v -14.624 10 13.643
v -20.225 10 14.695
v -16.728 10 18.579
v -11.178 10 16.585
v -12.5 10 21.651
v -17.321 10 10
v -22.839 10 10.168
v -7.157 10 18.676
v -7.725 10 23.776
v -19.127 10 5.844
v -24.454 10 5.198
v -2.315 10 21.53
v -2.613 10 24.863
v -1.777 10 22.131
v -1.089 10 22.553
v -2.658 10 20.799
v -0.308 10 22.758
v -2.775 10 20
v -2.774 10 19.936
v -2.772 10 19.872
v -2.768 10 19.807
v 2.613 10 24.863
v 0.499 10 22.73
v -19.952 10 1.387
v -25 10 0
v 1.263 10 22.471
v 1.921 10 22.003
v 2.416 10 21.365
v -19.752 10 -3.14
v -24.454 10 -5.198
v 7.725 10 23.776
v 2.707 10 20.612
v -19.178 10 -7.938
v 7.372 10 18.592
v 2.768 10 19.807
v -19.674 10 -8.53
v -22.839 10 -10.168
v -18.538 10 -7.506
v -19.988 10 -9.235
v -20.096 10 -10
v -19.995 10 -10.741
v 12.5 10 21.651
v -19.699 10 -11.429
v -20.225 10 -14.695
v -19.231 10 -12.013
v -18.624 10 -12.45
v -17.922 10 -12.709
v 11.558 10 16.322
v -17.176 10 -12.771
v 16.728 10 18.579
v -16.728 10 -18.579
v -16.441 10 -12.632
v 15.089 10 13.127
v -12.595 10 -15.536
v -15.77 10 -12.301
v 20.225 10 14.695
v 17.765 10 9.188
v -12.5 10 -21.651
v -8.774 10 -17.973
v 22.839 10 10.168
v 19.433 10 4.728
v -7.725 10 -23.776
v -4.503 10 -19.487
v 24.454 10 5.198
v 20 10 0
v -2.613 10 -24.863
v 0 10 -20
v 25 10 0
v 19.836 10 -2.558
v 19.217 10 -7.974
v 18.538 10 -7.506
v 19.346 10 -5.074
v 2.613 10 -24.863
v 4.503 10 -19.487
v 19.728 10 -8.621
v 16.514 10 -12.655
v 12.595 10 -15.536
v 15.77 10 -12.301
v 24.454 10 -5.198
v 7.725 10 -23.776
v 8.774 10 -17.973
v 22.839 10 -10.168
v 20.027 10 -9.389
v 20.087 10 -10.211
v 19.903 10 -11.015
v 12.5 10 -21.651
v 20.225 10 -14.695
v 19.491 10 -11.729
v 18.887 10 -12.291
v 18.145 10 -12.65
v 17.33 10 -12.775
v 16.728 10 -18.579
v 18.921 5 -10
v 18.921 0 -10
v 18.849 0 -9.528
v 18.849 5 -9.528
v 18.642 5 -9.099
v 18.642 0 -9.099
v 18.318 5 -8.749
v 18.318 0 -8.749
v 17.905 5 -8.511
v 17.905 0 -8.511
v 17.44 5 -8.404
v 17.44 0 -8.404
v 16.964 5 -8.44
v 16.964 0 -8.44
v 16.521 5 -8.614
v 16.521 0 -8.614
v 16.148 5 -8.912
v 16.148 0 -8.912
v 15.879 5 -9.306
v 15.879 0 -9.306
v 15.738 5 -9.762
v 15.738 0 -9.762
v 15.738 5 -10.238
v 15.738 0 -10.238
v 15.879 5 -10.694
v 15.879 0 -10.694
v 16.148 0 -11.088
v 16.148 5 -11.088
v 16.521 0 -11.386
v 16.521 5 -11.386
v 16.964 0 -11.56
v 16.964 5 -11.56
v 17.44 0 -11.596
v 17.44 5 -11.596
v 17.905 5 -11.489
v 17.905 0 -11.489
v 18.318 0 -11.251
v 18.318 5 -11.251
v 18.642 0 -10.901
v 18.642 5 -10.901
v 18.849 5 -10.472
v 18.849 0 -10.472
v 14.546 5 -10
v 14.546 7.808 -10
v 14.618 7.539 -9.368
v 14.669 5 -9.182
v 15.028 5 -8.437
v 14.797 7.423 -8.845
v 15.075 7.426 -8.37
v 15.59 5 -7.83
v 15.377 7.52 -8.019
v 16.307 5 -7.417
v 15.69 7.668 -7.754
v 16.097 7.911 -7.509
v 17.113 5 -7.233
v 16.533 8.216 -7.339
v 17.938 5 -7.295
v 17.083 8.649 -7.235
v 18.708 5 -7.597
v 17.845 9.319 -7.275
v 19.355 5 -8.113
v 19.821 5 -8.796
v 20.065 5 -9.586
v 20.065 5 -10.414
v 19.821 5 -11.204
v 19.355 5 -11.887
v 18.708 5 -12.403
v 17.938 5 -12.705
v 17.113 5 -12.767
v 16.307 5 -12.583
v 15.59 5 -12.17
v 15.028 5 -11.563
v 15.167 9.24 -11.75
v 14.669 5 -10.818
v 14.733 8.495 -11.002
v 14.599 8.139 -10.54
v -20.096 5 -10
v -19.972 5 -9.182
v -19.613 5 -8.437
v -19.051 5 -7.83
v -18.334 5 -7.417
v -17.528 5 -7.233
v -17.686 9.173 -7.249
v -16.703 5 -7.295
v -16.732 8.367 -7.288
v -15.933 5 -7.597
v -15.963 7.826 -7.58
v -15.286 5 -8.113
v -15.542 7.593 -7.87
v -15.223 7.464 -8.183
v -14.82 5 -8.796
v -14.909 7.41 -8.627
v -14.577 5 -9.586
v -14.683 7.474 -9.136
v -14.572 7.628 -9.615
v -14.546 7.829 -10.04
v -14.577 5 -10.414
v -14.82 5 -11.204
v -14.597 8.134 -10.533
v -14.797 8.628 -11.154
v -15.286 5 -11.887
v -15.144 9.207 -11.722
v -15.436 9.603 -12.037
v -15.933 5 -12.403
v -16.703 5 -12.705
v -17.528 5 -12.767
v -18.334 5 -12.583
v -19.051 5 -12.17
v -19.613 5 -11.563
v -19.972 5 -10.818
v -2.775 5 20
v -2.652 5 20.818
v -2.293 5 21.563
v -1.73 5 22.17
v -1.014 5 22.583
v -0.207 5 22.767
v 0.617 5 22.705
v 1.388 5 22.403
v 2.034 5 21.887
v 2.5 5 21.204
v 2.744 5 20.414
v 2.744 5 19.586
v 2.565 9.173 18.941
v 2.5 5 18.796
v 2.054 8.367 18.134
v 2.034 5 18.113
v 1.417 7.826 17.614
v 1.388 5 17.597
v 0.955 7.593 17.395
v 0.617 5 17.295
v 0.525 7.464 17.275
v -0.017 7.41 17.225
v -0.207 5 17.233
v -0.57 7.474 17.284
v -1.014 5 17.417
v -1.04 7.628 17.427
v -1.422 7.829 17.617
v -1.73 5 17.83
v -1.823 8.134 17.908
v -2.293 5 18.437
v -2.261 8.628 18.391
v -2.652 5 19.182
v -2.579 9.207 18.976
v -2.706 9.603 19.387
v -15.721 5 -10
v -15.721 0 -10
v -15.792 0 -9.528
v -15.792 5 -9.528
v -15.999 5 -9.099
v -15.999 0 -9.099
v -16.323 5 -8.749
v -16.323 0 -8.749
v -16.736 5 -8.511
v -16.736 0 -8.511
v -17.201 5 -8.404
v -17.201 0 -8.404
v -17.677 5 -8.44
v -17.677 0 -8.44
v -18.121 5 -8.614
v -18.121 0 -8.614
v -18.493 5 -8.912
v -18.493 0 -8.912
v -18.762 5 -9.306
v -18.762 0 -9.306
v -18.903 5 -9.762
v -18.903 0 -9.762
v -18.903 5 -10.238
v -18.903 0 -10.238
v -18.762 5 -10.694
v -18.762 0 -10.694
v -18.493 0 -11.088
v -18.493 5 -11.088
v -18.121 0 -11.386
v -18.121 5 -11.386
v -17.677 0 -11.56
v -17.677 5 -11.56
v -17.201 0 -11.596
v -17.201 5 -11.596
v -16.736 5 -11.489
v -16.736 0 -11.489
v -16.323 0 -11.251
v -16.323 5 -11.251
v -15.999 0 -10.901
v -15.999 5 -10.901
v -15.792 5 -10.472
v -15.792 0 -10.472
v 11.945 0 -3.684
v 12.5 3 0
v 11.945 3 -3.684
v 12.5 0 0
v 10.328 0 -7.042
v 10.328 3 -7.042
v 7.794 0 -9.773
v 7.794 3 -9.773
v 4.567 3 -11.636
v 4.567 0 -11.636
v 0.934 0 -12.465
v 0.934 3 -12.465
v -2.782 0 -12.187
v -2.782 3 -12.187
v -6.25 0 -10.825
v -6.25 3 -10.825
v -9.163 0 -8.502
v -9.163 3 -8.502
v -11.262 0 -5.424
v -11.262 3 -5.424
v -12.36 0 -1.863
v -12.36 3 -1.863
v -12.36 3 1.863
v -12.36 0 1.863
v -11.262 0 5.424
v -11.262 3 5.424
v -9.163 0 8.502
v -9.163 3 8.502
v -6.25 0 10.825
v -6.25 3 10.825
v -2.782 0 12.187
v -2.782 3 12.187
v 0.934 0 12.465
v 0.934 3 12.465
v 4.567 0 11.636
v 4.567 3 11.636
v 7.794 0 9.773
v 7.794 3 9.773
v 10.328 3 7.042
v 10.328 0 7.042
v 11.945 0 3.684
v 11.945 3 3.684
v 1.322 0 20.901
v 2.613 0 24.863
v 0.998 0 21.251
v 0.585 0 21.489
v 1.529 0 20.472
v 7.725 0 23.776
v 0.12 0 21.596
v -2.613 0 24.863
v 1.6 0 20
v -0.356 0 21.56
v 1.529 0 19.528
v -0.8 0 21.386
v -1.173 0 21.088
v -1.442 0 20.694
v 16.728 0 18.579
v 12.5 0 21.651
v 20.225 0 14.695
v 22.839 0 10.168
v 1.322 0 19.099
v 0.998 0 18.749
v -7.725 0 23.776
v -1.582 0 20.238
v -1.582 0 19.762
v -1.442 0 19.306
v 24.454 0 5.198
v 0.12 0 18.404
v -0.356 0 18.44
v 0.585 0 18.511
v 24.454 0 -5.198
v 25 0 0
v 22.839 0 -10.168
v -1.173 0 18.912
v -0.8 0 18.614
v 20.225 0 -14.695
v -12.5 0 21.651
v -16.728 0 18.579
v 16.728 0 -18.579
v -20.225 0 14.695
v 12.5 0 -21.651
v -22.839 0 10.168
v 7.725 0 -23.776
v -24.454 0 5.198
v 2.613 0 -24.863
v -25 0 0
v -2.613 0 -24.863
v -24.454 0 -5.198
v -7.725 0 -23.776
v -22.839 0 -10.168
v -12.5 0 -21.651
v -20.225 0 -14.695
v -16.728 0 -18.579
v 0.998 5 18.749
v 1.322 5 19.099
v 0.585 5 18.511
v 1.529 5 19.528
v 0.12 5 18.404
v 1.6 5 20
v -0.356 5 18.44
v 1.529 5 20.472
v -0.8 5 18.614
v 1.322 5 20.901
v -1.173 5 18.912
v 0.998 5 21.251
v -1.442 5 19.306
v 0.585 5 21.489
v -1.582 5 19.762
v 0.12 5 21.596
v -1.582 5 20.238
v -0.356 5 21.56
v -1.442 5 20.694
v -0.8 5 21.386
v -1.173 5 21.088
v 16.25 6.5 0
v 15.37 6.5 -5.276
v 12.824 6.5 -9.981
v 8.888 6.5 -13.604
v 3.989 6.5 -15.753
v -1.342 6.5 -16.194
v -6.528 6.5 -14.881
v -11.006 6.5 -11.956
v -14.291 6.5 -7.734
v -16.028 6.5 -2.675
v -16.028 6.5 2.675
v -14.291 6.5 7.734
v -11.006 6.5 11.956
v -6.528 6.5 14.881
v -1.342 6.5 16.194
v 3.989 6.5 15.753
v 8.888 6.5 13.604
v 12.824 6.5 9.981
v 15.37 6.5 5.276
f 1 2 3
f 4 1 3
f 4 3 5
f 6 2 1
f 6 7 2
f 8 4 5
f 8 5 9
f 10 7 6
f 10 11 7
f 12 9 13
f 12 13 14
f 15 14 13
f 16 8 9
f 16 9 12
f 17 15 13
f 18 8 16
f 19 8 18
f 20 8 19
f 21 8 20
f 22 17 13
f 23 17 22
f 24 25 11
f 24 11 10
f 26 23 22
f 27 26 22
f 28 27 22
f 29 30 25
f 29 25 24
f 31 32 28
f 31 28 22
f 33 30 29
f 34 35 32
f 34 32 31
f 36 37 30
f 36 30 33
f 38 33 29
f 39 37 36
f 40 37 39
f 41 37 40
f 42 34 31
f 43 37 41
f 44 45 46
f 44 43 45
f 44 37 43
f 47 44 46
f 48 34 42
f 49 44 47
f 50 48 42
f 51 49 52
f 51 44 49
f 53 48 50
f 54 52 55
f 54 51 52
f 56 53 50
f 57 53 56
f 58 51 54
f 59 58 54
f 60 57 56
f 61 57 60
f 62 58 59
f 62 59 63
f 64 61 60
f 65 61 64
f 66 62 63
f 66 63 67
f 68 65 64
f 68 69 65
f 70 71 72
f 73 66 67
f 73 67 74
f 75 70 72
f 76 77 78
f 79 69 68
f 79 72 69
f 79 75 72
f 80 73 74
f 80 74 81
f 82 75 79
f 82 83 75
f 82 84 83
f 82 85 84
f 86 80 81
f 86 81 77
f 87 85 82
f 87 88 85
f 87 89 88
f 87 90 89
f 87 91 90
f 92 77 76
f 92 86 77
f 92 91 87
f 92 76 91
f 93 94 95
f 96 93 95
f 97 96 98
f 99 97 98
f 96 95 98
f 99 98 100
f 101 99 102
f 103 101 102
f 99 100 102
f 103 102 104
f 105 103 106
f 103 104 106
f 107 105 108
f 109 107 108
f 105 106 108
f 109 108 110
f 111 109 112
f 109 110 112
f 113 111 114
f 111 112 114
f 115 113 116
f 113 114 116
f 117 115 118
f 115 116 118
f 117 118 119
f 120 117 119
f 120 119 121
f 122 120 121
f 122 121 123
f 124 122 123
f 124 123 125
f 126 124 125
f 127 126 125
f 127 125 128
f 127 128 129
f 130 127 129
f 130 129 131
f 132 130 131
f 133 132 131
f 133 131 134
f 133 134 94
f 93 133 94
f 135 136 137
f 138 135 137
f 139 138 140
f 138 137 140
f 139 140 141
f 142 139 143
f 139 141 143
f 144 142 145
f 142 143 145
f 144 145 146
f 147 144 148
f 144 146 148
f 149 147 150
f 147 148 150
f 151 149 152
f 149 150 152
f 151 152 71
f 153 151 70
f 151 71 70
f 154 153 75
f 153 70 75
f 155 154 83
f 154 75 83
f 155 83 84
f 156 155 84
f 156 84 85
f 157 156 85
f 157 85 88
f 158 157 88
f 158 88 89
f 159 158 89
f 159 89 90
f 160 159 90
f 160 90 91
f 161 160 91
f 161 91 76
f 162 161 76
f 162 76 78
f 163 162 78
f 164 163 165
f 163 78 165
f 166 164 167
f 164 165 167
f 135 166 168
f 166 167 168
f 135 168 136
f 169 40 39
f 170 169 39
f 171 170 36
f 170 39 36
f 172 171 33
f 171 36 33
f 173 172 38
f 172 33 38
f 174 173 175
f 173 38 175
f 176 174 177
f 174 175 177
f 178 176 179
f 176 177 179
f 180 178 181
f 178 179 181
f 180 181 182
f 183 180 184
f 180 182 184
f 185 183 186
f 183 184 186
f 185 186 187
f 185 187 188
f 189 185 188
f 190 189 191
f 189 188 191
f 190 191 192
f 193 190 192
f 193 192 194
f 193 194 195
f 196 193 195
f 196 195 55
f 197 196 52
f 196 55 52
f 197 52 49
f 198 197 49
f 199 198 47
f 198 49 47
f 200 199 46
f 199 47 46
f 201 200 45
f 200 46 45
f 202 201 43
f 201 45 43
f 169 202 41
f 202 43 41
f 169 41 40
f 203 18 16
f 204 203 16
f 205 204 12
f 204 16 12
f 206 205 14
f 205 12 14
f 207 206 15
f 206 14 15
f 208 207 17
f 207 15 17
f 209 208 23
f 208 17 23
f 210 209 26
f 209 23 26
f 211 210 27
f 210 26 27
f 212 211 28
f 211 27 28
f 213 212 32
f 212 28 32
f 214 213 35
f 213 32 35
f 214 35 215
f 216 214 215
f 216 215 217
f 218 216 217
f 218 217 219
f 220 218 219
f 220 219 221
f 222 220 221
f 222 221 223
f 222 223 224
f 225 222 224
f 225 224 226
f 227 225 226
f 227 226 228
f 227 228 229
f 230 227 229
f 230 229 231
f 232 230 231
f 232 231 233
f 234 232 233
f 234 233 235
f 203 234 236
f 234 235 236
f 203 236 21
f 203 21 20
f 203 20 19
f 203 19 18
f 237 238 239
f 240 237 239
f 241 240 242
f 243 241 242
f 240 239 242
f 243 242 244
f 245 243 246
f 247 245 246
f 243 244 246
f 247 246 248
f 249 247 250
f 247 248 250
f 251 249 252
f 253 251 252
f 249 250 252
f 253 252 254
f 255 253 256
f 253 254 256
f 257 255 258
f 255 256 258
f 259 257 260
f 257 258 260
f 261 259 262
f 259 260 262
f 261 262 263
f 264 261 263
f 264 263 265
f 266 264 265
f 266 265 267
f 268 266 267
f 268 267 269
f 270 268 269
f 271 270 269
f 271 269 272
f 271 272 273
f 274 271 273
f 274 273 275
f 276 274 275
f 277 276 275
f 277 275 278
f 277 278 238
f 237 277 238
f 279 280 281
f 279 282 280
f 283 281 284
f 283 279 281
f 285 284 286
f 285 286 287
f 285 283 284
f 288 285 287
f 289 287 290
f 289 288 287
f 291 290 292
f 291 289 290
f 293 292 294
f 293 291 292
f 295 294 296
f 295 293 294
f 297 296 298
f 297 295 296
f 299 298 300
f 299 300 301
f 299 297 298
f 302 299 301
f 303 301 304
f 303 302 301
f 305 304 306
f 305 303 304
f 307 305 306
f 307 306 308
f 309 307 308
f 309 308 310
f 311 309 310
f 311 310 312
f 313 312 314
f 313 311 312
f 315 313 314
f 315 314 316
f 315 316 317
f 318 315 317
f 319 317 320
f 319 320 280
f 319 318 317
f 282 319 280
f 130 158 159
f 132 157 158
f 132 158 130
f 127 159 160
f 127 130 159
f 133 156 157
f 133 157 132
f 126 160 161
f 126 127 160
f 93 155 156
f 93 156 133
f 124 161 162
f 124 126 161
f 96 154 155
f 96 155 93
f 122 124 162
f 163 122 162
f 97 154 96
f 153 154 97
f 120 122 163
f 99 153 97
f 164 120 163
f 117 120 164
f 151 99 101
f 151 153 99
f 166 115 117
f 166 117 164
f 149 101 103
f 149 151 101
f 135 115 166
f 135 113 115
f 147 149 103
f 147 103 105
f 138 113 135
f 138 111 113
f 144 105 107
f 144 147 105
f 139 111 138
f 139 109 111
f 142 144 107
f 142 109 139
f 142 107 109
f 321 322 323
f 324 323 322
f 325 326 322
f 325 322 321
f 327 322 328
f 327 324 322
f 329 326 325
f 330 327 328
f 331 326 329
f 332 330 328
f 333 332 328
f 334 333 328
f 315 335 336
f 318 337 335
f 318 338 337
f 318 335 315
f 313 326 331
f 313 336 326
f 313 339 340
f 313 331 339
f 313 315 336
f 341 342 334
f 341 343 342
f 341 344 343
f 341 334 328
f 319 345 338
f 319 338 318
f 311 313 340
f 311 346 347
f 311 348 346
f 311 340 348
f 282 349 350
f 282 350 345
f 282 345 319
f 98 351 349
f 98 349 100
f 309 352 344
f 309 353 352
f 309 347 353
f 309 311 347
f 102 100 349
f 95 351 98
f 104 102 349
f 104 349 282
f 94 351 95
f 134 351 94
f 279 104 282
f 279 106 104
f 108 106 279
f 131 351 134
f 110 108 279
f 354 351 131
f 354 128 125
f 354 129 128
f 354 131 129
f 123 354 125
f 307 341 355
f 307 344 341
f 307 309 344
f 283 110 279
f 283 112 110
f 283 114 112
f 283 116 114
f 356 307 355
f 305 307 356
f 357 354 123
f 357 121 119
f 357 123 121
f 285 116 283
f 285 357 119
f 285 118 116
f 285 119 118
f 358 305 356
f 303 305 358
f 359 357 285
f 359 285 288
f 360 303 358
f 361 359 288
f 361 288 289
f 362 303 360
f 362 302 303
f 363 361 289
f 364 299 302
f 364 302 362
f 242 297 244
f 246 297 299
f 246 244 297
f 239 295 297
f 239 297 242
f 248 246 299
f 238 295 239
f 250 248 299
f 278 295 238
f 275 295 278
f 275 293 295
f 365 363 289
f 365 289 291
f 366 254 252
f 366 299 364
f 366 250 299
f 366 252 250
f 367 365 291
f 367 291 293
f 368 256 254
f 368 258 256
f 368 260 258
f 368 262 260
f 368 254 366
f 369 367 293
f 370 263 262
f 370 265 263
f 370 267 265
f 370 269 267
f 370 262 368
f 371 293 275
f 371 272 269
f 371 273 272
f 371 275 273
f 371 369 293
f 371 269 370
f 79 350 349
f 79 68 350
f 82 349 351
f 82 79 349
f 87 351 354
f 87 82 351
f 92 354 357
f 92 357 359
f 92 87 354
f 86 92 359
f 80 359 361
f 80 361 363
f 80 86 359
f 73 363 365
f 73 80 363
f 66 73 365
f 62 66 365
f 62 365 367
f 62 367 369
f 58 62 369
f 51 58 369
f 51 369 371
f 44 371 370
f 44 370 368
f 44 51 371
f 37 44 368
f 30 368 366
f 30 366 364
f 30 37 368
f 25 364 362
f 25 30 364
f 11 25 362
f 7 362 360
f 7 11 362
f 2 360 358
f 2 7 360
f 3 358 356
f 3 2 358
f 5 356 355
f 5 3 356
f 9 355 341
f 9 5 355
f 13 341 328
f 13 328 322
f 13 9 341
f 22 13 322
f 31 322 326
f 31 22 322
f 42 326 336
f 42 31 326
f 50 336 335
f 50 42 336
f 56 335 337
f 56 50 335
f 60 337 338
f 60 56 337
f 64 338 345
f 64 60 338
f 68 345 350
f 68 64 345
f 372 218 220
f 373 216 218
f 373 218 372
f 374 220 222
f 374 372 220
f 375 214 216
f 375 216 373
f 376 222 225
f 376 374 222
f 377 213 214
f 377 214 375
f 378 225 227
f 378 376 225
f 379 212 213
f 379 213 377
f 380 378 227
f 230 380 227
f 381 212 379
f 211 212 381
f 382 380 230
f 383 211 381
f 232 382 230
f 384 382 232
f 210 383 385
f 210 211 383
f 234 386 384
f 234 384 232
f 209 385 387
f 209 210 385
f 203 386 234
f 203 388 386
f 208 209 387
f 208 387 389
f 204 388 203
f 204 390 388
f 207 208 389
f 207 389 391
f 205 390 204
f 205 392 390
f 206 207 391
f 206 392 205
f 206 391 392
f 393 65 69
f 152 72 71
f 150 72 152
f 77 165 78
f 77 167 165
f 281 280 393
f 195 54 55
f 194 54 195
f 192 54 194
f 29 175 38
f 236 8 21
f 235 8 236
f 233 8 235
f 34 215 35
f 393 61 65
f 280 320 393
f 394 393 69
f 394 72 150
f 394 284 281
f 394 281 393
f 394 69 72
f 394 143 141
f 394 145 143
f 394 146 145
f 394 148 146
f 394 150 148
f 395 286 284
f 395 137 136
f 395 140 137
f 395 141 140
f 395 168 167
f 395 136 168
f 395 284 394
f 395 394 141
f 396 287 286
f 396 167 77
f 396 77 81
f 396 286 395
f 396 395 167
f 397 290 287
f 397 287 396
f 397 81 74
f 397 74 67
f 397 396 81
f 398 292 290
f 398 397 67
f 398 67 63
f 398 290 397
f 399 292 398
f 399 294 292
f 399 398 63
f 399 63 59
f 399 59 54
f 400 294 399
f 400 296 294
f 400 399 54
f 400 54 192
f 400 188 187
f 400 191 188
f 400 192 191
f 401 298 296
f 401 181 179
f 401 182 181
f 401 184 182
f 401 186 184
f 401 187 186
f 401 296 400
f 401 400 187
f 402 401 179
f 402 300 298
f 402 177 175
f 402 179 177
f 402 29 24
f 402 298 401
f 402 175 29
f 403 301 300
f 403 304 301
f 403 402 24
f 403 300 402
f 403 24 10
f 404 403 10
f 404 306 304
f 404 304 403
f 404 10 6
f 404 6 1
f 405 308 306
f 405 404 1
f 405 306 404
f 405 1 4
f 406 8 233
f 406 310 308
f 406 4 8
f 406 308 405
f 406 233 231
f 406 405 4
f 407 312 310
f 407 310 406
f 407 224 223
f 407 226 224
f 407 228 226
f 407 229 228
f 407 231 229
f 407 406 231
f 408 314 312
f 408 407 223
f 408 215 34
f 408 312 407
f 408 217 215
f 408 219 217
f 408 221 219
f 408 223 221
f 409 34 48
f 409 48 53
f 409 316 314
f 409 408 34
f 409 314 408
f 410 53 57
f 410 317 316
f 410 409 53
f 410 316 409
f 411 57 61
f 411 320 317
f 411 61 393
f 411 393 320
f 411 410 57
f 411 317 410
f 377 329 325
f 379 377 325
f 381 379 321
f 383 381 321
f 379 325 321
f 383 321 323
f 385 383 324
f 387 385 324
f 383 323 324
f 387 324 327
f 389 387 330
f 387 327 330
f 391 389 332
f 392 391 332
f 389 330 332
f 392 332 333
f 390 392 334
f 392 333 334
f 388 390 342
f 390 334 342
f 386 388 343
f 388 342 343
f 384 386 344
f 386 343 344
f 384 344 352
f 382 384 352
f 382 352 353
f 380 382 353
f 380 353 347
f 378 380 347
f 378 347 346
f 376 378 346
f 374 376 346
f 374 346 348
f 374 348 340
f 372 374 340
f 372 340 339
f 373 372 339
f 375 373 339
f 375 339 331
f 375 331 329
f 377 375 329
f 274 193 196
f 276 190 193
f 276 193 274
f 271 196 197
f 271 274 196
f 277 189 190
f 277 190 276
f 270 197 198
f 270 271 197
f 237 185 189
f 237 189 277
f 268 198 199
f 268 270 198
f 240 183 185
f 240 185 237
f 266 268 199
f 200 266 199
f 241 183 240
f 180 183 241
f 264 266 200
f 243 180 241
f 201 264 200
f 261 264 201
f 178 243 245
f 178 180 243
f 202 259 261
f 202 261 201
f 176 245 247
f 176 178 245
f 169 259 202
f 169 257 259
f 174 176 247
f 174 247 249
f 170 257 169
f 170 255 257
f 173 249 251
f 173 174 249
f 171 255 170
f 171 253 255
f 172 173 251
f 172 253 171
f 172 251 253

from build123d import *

# Parameters (mm, degrees)
F3_R     = 1.6
F4_DEPTH = 25
F5_R     = 2.775
F6_DEPTH = 5


with BuildPart() as f2:
    # F0 (on Top) → F2 (revolve)
    with BuildSketch(Plane.XY):
        Polygon((12.5, 3), (12.5, 0), (25, 0), (25, 10), (20, 10), align=None)
    revolve(axis=Axis((0, 29.101241, 0), (0, 1, 0)))

    # F3 (on face) → F4 (cut)
    with BuildSketch(Plane.XZ):
        with Locations((0, 20)):
            Circle(F3_R)
        with Locations((-17.320508, -10)):
            Circle(F3_R)
        with Locations((17.320508, -10)):
            Circle(F3_R)
    extrude(amount=-F4_DEPTH, mode=Mode.SUBTRACT)

    # F5 (on face) → F6 (cut)
    with BuildSketch(Plane(origin=(0, 10, 0), x_dir=(-1, 0, 0), z_dir=(0, 1, 0))):
        with Locations((0, 20)):
            Circle(F5_R)
        with Locations((-17.320508, -10)):
            Circle(F5_R)
        with Locations((17.320508, -10)):
            Circle(F5_R)
    extrude(amount=-F6_DEPTH, mode=Mode.SUBTRACT)


solid = f2.part
